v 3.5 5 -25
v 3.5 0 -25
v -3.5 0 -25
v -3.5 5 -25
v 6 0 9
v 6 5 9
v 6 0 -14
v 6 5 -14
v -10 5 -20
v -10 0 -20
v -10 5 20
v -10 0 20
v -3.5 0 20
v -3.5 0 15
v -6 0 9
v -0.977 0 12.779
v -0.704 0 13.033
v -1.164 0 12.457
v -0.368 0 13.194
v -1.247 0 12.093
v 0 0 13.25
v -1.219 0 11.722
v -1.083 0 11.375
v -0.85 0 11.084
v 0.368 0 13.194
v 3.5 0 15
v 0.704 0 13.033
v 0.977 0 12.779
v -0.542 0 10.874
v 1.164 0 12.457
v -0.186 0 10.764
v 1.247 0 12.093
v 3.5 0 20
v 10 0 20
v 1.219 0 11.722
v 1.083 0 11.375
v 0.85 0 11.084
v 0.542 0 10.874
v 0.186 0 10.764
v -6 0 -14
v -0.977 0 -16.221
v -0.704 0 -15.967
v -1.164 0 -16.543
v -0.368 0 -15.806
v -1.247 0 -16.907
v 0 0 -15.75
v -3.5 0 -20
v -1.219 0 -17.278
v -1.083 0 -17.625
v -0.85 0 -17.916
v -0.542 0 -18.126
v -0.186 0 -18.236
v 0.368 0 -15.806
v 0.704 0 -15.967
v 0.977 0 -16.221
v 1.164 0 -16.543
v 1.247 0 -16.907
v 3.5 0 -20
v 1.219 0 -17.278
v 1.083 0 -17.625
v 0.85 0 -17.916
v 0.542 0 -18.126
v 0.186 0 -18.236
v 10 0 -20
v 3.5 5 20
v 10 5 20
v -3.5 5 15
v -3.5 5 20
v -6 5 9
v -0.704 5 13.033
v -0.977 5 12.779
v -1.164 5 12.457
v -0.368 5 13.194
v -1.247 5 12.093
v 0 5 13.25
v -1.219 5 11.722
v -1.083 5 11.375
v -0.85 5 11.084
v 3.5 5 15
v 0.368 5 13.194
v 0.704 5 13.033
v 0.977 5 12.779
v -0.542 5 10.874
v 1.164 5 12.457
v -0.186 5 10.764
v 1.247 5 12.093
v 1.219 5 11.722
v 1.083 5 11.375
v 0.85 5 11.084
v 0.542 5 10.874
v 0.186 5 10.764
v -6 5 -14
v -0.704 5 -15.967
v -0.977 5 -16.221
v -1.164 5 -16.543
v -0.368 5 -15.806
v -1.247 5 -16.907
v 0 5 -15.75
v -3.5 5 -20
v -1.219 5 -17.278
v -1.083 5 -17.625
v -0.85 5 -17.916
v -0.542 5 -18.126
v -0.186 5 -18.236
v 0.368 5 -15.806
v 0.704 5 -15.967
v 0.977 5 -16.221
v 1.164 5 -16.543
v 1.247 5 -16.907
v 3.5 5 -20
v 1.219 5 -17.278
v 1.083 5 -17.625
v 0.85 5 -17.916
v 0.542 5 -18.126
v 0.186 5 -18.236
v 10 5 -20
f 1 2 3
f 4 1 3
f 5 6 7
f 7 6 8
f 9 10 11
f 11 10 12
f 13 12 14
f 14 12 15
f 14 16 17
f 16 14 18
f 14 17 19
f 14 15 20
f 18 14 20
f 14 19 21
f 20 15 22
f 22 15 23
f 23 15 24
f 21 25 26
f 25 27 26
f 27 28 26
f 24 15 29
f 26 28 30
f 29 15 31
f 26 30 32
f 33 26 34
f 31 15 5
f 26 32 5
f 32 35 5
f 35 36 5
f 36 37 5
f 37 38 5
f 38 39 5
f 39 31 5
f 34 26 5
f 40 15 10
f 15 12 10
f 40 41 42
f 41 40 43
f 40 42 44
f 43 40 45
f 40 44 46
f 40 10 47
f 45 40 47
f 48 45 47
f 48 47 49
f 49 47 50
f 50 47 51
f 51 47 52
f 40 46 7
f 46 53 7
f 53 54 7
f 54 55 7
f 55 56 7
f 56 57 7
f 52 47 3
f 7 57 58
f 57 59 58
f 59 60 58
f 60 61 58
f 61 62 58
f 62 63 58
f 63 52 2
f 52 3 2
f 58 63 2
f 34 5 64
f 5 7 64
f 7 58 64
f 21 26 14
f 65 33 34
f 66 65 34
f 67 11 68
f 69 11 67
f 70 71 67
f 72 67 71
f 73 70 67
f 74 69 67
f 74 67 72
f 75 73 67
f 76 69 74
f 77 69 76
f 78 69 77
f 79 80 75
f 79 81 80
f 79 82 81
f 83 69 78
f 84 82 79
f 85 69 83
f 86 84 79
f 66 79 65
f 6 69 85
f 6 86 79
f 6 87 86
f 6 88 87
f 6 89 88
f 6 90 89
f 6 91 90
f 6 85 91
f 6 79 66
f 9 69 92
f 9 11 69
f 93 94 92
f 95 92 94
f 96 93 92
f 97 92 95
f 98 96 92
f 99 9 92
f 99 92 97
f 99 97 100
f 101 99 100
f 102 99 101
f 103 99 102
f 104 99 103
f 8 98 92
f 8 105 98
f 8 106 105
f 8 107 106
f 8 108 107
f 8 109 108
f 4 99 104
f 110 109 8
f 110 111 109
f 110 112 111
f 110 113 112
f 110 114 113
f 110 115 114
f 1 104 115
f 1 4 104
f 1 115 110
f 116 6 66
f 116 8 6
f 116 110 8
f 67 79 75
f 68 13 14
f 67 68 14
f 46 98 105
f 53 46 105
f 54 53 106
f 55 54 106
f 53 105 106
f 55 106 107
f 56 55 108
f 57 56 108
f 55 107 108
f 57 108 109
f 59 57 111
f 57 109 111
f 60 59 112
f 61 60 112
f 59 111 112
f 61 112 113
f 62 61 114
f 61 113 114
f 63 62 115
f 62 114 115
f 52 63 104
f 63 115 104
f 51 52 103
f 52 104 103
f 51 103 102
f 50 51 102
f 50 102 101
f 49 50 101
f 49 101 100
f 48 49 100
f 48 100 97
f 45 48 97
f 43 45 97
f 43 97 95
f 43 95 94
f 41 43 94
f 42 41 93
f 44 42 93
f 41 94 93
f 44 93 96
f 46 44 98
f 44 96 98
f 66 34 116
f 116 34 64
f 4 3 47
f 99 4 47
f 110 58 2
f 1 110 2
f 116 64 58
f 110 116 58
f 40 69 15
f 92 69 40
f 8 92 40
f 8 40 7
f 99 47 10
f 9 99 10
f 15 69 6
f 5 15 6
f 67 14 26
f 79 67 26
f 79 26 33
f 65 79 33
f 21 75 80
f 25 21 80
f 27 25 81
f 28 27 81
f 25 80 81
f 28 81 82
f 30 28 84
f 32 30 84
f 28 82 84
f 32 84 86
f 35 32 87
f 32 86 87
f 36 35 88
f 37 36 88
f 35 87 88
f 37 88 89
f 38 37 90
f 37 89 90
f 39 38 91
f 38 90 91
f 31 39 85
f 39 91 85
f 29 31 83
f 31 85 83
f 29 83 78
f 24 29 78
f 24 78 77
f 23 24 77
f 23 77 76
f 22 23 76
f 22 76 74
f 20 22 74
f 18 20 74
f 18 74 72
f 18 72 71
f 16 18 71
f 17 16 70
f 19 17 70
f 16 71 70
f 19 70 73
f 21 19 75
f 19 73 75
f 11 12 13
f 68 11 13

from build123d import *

# Parameters (mm, degrees)
BOSS_EXTRUDE1_DEPTH = 5
SKETCH2_R           = 1.25
SKETCH2_W           = 12
SKETCH2_H           = 23
CUT_EXTRUDE1_DEPTH  = 5


with BuildPart() as part:
    # Sketch1 → Boss-Extrude1 (new body)
    with BuildSketch(Plane(origin=(0, 0, 0), x_dir=(1, 0, 0), z_dir=(0, 1, 0))):
        Polygon((-10, 20), (-10, -20), (-3.5, -20), (-3.5, -15), (3.5, -15), (3.5, -20), (10, -20), (10, 20), (3.5, 20), (3.5, 25), (-3.5, 25), (-3.5, 20), align=None)
    extrude(amount=BOSS_EXTRUDE1_DEPTH)

    # Sketch2 → Cut-Extrude1 (cut)
    with BuildSketch(Plane(origin=(0, 5, 0), x_dir=(1, 0, 0), z_dir=(0, 1, 0))):
        with Locations(Location((0, 17, 0), (0, 0, 270))):
            Circle(SKETCH2_R)
        with Locations(Location((0, -12, 0), (0, 0, 270))):
            Circle(SKETCH2_R)
        with Locations((0, 2.5)):
            Rectangle(SKETCH2_W, SKETCH2_H)
    extrude(amount=-CUT_EXTRUDE1_DEPTH, mode=Mode.SUBTRACT)


solid = part.part
